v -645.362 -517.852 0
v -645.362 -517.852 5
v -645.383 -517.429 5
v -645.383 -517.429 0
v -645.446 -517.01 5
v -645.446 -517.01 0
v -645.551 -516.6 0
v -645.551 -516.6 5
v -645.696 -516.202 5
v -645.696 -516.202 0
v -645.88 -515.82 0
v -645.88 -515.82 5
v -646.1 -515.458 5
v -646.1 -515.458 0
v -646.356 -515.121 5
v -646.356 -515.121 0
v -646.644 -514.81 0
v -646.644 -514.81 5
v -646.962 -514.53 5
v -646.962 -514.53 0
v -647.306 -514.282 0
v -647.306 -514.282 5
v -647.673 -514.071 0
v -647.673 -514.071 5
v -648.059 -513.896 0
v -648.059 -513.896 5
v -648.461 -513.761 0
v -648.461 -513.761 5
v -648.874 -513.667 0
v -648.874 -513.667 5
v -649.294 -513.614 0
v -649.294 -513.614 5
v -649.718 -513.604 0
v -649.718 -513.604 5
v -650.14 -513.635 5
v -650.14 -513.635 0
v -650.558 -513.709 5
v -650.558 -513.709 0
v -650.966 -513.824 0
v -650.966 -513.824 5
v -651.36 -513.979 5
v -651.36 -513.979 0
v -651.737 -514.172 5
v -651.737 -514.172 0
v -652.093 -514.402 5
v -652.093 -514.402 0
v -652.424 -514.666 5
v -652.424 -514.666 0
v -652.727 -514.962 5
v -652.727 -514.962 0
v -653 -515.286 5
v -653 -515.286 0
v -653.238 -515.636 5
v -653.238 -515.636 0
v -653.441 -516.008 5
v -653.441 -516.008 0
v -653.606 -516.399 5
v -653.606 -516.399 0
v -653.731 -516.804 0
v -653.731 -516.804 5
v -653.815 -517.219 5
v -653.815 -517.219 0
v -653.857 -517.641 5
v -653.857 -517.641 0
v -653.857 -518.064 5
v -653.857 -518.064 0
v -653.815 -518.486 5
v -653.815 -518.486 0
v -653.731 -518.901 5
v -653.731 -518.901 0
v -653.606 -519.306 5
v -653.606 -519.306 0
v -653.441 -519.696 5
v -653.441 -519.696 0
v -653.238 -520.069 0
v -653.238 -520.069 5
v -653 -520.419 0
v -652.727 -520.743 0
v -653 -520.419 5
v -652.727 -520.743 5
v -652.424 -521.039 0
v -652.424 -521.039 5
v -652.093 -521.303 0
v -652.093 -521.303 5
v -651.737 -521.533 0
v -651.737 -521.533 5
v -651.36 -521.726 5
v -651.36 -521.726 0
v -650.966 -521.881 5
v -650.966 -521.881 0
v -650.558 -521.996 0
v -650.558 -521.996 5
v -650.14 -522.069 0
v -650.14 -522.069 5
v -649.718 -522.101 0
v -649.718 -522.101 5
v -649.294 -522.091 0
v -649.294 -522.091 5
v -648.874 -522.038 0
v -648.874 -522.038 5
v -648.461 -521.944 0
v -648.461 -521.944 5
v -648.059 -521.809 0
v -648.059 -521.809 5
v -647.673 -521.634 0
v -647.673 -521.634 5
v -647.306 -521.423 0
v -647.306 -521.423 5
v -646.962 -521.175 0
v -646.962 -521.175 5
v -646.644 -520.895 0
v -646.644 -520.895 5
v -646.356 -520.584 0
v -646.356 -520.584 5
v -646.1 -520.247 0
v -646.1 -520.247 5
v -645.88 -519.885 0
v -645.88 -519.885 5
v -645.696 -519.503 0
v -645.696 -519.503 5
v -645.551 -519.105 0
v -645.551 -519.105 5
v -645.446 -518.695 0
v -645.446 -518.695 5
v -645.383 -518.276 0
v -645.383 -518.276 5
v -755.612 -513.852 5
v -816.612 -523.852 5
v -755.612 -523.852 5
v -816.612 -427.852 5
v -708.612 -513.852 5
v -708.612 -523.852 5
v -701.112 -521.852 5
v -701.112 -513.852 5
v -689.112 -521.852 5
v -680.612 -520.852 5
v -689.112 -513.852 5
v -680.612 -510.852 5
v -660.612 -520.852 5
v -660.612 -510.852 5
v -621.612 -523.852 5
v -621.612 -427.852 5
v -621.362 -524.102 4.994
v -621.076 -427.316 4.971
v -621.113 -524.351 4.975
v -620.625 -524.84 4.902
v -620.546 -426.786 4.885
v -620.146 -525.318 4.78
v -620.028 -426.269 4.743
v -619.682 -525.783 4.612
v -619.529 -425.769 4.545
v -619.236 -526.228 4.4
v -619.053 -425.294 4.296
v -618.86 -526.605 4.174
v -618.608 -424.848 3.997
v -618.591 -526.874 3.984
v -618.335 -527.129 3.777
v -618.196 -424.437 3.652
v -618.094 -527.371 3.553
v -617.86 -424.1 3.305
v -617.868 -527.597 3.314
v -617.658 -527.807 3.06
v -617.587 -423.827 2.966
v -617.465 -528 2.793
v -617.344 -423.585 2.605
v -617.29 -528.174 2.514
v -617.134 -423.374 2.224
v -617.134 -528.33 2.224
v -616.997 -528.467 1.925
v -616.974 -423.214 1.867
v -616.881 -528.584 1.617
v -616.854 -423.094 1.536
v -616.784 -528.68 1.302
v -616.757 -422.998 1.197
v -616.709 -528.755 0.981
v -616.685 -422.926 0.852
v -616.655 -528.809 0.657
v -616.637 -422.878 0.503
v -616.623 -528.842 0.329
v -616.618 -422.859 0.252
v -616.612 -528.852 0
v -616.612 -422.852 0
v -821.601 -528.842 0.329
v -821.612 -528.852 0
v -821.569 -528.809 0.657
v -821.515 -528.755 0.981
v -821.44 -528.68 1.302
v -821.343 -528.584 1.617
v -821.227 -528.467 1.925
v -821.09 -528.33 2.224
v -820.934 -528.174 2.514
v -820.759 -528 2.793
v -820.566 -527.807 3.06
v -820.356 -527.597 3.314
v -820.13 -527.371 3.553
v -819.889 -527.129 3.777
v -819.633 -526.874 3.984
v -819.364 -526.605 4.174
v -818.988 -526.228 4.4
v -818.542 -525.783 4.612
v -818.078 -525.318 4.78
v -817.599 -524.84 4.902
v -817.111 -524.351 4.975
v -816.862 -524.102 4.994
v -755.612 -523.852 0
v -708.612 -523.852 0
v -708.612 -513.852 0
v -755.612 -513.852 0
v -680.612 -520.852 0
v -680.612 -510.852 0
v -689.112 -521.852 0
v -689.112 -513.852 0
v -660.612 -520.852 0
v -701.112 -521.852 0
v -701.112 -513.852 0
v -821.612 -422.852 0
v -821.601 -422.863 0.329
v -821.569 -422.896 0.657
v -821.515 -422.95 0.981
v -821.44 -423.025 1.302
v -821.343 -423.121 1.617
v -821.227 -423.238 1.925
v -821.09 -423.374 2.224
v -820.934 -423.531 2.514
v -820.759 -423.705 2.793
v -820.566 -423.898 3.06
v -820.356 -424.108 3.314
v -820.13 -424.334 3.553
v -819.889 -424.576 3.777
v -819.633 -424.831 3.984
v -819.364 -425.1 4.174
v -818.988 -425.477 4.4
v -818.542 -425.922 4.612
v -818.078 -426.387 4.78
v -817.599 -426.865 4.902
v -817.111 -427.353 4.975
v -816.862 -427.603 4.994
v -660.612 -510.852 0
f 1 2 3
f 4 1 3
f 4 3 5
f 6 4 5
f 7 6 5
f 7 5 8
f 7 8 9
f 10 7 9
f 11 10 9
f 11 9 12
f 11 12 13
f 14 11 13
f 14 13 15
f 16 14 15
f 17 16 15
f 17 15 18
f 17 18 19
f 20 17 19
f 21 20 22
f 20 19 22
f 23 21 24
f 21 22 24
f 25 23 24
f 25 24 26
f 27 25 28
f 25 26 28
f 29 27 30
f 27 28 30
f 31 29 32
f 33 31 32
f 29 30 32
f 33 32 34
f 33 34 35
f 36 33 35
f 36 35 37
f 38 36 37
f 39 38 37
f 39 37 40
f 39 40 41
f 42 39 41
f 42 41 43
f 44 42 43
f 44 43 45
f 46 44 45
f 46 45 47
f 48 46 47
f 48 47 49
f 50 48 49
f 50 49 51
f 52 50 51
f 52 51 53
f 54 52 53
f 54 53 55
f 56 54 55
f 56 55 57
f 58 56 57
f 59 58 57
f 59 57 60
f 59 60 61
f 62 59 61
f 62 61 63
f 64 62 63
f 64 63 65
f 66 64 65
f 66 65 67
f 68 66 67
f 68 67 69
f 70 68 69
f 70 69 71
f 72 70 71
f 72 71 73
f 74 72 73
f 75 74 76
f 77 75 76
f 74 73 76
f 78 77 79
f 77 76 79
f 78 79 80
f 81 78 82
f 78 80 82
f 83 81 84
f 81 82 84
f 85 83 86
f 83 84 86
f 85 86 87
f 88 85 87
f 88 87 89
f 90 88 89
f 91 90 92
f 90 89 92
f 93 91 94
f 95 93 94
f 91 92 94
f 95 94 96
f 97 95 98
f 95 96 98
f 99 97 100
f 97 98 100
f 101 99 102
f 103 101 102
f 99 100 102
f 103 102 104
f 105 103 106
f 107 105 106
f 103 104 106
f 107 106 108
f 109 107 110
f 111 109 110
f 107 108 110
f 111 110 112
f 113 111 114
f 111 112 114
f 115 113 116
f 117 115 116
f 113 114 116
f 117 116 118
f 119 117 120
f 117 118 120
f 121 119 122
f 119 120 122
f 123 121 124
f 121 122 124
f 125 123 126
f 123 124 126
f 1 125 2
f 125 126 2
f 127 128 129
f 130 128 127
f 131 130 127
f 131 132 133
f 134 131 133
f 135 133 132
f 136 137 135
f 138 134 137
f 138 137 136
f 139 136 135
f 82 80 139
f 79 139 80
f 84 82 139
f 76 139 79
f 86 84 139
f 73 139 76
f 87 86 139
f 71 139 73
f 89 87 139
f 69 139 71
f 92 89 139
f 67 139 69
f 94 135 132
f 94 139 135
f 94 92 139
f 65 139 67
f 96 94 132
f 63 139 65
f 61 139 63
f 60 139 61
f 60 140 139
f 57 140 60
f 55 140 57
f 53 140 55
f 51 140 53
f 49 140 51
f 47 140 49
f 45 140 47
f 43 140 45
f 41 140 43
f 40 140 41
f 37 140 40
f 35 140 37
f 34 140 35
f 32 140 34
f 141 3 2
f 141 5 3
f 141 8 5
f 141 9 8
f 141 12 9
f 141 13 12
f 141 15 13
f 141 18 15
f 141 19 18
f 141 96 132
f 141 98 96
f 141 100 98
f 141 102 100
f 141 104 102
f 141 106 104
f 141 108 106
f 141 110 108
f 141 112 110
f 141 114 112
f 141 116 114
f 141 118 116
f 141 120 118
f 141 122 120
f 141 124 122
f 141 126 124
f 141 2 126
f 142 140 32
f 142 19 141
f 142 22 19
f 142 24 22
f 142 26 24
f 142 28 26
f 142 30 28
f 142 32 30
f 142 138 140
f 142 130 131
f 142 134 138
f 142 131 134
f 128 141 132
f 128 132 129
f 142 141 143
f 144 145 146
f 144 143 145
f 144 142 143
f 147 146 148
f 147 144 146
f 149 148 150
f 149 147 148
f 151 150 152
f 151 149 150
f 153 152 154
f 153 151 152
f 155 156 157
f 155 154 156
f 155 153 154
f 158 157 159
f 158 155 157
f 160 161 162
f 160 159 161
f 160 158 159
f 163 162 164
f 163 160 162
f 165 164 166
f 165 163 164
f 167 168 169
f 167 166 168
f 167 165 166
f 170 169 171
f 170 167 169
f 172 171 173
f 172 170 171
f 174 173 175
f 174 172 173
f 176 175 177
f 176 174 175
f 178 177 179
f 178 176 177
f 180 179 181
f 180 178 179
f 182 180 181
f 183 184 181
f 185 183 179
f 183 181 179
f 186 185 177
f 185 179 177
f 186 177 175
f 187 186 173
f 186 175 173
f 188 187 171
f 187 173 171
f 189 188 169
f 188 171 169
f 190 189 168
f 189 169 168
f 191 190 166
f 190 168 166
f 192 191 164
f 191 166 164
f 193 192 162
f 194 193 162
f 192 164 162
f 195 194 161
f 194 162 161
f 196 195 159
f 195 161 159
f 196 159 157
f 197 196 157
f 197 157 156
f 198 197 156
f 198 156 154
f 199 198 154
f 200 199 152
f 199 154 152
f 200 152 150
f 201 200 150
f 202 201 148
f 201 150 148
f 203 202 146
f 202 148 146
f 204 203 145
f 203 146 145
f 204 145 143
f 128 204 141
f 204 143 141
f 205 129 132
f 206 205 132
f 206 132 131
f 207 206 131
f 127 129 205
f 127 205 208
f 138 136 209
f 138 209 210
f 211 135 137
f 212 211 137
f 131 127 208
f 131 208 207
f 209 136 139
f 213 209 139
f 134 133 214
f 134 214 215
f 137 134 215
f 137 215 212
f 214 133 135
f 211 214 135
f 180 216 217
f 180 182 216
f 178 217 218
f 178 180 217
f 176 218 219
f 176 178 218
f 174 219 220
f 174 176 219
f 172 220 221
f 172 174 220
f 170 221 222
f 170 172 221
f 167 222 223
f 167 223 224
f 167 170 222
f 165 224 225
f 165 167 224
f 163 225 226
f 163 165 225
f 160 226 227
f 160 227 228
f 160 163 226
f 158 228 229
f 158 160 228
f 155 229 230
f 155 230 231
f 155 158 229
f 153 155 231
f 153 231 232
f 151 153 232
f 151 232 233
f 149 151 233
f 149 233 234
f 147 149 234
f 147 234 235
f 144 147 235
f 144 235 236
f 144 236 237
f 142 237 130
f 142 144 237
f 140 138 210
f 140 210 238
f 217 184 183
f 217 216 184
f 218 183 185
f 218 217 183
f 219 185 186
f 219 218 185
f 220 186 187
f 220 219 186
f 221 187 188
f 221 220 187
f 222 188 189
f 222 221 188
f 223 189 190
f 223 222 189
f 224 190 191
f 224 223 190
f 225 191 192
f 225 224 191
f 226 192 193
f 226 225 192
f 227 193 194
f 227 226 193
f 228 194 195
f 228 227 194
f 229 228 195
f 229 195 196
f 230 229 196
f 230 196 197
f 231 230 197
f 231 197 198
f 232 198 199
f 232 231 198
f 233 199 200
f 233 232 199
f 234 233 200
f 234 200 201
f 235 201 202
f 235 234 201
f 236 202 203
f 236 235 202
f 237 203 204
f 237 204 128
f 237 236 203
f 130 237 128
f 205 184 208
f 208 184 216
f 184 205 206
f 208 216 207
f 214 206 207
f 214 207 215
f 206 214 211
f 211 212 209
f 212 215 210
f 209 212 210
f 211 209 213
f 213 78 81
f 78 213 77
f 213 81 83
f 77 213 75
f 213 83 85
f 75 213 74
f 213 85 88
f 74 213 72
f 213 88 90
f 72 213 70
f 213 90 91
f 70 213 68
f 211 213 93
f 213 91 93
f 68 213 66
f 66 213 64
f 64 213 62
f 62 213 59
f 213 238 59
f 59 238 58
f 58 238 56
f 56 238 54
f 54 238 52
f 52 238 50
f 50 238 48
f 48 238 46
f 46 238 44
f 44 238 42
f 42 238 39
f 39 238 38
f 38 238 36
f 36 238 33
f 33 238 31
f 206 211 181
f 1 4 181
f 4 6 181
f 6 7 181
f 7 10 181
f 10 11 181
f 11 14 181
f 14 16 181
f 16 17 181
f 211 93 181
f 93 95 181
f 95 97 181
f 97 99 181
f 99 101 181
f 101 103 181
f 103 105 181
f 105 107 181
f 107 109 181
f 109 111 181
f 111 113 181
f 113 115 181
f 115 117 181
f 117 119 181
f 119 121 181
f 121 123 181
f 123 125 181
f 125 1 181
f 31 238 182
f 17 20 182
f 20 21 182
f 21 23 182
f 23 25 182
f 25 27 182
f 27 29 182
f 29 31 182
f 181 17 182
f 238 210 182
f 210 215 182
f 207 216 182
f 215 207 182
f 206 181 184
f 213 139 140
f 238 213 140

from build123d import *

# Parameters (mm, degrees)
F0_W      = 205
F0_H      = 106
F1_DEPTH  = 5
F2_R      = 4.25
F3_DEPTH  = 500
F4_W      = 20
F4_H      = 10
F5_DEPTH  = 500
F6_W      = 12
F6_H      = 8
F7_DEPTH  = 500
F8_R      = 4.99999
F9_W      = 47
F9_H      = 10
F10_DEPTH = 500


# Not quite as in the source:
# - a fillet or chamfer is up to 0.001 mm smaller than in the source, because OpenCascade refuses the exact size


with BuildPart() as f1:
    # F0 (on Top) → F1 (new body)
    with BuildSketch(Plane.XY):
        with Locations((-719.1119938903, -475.8524597138)):
            Rectangle(F0_W, F0_H)
    extrude(amount=F1_DEPTH)

    # F2 (on face) → F3 (cut)
    with BuildSketch(Plane.XY.offset(5)):
        with Locations((-649.6119938903, -517.8524597138)):
            Circle(F2_R)
    extrude(amount=-F3_DEPTH, mode=Mode.SUBTRACT)

    # F4 (on face) → F5 (cut)
    with BuildSketch(Plane.XY.offset(5)):
        with Locations((-670.6119938903, -515.8524597138)):
            Rectangle(F4_W, F4_H)
    extrude(amount=-F5_DEPTH, mode=Mode.SUBTRACT)

    # F6 (on face) → F7 (cut)
    with BuildSketch(Plane.XY.offset(5)):
        with Locations((-695.1119938903, -517.8524597138)):
            Rectangle(F6_W, F6_H)
    extrude(amount=-F7_DEPTH, mode=Mode.SUBTRACT)

    # F8 (radius 5 in the source; OpenCascade refuses exactly that, so slightly less here)
    f8_edges = [f1.edges().sort_by_distance(p)[0] for p in [
        (-821.611994, -475.85246, 5),
        (-719.111994, -528.85246, 5),
        (-616.611994, -475.85246, 5),
        (-719.111994, -422.85246, 5),
    ]]
    fillet(f8_edges, radius=F8_R)

    # F9 (on face) → F10 (cut)
    with BuildSketch(Plane.XY.offset(5)):
        with Locations((-732.1119938903, -518.8524597138)):
            Rectangle(F9_W, F9_H)
    extrude(amount=-F10_DEPTH, mode=Mode.SUBTRACT)


solid = f1.part
